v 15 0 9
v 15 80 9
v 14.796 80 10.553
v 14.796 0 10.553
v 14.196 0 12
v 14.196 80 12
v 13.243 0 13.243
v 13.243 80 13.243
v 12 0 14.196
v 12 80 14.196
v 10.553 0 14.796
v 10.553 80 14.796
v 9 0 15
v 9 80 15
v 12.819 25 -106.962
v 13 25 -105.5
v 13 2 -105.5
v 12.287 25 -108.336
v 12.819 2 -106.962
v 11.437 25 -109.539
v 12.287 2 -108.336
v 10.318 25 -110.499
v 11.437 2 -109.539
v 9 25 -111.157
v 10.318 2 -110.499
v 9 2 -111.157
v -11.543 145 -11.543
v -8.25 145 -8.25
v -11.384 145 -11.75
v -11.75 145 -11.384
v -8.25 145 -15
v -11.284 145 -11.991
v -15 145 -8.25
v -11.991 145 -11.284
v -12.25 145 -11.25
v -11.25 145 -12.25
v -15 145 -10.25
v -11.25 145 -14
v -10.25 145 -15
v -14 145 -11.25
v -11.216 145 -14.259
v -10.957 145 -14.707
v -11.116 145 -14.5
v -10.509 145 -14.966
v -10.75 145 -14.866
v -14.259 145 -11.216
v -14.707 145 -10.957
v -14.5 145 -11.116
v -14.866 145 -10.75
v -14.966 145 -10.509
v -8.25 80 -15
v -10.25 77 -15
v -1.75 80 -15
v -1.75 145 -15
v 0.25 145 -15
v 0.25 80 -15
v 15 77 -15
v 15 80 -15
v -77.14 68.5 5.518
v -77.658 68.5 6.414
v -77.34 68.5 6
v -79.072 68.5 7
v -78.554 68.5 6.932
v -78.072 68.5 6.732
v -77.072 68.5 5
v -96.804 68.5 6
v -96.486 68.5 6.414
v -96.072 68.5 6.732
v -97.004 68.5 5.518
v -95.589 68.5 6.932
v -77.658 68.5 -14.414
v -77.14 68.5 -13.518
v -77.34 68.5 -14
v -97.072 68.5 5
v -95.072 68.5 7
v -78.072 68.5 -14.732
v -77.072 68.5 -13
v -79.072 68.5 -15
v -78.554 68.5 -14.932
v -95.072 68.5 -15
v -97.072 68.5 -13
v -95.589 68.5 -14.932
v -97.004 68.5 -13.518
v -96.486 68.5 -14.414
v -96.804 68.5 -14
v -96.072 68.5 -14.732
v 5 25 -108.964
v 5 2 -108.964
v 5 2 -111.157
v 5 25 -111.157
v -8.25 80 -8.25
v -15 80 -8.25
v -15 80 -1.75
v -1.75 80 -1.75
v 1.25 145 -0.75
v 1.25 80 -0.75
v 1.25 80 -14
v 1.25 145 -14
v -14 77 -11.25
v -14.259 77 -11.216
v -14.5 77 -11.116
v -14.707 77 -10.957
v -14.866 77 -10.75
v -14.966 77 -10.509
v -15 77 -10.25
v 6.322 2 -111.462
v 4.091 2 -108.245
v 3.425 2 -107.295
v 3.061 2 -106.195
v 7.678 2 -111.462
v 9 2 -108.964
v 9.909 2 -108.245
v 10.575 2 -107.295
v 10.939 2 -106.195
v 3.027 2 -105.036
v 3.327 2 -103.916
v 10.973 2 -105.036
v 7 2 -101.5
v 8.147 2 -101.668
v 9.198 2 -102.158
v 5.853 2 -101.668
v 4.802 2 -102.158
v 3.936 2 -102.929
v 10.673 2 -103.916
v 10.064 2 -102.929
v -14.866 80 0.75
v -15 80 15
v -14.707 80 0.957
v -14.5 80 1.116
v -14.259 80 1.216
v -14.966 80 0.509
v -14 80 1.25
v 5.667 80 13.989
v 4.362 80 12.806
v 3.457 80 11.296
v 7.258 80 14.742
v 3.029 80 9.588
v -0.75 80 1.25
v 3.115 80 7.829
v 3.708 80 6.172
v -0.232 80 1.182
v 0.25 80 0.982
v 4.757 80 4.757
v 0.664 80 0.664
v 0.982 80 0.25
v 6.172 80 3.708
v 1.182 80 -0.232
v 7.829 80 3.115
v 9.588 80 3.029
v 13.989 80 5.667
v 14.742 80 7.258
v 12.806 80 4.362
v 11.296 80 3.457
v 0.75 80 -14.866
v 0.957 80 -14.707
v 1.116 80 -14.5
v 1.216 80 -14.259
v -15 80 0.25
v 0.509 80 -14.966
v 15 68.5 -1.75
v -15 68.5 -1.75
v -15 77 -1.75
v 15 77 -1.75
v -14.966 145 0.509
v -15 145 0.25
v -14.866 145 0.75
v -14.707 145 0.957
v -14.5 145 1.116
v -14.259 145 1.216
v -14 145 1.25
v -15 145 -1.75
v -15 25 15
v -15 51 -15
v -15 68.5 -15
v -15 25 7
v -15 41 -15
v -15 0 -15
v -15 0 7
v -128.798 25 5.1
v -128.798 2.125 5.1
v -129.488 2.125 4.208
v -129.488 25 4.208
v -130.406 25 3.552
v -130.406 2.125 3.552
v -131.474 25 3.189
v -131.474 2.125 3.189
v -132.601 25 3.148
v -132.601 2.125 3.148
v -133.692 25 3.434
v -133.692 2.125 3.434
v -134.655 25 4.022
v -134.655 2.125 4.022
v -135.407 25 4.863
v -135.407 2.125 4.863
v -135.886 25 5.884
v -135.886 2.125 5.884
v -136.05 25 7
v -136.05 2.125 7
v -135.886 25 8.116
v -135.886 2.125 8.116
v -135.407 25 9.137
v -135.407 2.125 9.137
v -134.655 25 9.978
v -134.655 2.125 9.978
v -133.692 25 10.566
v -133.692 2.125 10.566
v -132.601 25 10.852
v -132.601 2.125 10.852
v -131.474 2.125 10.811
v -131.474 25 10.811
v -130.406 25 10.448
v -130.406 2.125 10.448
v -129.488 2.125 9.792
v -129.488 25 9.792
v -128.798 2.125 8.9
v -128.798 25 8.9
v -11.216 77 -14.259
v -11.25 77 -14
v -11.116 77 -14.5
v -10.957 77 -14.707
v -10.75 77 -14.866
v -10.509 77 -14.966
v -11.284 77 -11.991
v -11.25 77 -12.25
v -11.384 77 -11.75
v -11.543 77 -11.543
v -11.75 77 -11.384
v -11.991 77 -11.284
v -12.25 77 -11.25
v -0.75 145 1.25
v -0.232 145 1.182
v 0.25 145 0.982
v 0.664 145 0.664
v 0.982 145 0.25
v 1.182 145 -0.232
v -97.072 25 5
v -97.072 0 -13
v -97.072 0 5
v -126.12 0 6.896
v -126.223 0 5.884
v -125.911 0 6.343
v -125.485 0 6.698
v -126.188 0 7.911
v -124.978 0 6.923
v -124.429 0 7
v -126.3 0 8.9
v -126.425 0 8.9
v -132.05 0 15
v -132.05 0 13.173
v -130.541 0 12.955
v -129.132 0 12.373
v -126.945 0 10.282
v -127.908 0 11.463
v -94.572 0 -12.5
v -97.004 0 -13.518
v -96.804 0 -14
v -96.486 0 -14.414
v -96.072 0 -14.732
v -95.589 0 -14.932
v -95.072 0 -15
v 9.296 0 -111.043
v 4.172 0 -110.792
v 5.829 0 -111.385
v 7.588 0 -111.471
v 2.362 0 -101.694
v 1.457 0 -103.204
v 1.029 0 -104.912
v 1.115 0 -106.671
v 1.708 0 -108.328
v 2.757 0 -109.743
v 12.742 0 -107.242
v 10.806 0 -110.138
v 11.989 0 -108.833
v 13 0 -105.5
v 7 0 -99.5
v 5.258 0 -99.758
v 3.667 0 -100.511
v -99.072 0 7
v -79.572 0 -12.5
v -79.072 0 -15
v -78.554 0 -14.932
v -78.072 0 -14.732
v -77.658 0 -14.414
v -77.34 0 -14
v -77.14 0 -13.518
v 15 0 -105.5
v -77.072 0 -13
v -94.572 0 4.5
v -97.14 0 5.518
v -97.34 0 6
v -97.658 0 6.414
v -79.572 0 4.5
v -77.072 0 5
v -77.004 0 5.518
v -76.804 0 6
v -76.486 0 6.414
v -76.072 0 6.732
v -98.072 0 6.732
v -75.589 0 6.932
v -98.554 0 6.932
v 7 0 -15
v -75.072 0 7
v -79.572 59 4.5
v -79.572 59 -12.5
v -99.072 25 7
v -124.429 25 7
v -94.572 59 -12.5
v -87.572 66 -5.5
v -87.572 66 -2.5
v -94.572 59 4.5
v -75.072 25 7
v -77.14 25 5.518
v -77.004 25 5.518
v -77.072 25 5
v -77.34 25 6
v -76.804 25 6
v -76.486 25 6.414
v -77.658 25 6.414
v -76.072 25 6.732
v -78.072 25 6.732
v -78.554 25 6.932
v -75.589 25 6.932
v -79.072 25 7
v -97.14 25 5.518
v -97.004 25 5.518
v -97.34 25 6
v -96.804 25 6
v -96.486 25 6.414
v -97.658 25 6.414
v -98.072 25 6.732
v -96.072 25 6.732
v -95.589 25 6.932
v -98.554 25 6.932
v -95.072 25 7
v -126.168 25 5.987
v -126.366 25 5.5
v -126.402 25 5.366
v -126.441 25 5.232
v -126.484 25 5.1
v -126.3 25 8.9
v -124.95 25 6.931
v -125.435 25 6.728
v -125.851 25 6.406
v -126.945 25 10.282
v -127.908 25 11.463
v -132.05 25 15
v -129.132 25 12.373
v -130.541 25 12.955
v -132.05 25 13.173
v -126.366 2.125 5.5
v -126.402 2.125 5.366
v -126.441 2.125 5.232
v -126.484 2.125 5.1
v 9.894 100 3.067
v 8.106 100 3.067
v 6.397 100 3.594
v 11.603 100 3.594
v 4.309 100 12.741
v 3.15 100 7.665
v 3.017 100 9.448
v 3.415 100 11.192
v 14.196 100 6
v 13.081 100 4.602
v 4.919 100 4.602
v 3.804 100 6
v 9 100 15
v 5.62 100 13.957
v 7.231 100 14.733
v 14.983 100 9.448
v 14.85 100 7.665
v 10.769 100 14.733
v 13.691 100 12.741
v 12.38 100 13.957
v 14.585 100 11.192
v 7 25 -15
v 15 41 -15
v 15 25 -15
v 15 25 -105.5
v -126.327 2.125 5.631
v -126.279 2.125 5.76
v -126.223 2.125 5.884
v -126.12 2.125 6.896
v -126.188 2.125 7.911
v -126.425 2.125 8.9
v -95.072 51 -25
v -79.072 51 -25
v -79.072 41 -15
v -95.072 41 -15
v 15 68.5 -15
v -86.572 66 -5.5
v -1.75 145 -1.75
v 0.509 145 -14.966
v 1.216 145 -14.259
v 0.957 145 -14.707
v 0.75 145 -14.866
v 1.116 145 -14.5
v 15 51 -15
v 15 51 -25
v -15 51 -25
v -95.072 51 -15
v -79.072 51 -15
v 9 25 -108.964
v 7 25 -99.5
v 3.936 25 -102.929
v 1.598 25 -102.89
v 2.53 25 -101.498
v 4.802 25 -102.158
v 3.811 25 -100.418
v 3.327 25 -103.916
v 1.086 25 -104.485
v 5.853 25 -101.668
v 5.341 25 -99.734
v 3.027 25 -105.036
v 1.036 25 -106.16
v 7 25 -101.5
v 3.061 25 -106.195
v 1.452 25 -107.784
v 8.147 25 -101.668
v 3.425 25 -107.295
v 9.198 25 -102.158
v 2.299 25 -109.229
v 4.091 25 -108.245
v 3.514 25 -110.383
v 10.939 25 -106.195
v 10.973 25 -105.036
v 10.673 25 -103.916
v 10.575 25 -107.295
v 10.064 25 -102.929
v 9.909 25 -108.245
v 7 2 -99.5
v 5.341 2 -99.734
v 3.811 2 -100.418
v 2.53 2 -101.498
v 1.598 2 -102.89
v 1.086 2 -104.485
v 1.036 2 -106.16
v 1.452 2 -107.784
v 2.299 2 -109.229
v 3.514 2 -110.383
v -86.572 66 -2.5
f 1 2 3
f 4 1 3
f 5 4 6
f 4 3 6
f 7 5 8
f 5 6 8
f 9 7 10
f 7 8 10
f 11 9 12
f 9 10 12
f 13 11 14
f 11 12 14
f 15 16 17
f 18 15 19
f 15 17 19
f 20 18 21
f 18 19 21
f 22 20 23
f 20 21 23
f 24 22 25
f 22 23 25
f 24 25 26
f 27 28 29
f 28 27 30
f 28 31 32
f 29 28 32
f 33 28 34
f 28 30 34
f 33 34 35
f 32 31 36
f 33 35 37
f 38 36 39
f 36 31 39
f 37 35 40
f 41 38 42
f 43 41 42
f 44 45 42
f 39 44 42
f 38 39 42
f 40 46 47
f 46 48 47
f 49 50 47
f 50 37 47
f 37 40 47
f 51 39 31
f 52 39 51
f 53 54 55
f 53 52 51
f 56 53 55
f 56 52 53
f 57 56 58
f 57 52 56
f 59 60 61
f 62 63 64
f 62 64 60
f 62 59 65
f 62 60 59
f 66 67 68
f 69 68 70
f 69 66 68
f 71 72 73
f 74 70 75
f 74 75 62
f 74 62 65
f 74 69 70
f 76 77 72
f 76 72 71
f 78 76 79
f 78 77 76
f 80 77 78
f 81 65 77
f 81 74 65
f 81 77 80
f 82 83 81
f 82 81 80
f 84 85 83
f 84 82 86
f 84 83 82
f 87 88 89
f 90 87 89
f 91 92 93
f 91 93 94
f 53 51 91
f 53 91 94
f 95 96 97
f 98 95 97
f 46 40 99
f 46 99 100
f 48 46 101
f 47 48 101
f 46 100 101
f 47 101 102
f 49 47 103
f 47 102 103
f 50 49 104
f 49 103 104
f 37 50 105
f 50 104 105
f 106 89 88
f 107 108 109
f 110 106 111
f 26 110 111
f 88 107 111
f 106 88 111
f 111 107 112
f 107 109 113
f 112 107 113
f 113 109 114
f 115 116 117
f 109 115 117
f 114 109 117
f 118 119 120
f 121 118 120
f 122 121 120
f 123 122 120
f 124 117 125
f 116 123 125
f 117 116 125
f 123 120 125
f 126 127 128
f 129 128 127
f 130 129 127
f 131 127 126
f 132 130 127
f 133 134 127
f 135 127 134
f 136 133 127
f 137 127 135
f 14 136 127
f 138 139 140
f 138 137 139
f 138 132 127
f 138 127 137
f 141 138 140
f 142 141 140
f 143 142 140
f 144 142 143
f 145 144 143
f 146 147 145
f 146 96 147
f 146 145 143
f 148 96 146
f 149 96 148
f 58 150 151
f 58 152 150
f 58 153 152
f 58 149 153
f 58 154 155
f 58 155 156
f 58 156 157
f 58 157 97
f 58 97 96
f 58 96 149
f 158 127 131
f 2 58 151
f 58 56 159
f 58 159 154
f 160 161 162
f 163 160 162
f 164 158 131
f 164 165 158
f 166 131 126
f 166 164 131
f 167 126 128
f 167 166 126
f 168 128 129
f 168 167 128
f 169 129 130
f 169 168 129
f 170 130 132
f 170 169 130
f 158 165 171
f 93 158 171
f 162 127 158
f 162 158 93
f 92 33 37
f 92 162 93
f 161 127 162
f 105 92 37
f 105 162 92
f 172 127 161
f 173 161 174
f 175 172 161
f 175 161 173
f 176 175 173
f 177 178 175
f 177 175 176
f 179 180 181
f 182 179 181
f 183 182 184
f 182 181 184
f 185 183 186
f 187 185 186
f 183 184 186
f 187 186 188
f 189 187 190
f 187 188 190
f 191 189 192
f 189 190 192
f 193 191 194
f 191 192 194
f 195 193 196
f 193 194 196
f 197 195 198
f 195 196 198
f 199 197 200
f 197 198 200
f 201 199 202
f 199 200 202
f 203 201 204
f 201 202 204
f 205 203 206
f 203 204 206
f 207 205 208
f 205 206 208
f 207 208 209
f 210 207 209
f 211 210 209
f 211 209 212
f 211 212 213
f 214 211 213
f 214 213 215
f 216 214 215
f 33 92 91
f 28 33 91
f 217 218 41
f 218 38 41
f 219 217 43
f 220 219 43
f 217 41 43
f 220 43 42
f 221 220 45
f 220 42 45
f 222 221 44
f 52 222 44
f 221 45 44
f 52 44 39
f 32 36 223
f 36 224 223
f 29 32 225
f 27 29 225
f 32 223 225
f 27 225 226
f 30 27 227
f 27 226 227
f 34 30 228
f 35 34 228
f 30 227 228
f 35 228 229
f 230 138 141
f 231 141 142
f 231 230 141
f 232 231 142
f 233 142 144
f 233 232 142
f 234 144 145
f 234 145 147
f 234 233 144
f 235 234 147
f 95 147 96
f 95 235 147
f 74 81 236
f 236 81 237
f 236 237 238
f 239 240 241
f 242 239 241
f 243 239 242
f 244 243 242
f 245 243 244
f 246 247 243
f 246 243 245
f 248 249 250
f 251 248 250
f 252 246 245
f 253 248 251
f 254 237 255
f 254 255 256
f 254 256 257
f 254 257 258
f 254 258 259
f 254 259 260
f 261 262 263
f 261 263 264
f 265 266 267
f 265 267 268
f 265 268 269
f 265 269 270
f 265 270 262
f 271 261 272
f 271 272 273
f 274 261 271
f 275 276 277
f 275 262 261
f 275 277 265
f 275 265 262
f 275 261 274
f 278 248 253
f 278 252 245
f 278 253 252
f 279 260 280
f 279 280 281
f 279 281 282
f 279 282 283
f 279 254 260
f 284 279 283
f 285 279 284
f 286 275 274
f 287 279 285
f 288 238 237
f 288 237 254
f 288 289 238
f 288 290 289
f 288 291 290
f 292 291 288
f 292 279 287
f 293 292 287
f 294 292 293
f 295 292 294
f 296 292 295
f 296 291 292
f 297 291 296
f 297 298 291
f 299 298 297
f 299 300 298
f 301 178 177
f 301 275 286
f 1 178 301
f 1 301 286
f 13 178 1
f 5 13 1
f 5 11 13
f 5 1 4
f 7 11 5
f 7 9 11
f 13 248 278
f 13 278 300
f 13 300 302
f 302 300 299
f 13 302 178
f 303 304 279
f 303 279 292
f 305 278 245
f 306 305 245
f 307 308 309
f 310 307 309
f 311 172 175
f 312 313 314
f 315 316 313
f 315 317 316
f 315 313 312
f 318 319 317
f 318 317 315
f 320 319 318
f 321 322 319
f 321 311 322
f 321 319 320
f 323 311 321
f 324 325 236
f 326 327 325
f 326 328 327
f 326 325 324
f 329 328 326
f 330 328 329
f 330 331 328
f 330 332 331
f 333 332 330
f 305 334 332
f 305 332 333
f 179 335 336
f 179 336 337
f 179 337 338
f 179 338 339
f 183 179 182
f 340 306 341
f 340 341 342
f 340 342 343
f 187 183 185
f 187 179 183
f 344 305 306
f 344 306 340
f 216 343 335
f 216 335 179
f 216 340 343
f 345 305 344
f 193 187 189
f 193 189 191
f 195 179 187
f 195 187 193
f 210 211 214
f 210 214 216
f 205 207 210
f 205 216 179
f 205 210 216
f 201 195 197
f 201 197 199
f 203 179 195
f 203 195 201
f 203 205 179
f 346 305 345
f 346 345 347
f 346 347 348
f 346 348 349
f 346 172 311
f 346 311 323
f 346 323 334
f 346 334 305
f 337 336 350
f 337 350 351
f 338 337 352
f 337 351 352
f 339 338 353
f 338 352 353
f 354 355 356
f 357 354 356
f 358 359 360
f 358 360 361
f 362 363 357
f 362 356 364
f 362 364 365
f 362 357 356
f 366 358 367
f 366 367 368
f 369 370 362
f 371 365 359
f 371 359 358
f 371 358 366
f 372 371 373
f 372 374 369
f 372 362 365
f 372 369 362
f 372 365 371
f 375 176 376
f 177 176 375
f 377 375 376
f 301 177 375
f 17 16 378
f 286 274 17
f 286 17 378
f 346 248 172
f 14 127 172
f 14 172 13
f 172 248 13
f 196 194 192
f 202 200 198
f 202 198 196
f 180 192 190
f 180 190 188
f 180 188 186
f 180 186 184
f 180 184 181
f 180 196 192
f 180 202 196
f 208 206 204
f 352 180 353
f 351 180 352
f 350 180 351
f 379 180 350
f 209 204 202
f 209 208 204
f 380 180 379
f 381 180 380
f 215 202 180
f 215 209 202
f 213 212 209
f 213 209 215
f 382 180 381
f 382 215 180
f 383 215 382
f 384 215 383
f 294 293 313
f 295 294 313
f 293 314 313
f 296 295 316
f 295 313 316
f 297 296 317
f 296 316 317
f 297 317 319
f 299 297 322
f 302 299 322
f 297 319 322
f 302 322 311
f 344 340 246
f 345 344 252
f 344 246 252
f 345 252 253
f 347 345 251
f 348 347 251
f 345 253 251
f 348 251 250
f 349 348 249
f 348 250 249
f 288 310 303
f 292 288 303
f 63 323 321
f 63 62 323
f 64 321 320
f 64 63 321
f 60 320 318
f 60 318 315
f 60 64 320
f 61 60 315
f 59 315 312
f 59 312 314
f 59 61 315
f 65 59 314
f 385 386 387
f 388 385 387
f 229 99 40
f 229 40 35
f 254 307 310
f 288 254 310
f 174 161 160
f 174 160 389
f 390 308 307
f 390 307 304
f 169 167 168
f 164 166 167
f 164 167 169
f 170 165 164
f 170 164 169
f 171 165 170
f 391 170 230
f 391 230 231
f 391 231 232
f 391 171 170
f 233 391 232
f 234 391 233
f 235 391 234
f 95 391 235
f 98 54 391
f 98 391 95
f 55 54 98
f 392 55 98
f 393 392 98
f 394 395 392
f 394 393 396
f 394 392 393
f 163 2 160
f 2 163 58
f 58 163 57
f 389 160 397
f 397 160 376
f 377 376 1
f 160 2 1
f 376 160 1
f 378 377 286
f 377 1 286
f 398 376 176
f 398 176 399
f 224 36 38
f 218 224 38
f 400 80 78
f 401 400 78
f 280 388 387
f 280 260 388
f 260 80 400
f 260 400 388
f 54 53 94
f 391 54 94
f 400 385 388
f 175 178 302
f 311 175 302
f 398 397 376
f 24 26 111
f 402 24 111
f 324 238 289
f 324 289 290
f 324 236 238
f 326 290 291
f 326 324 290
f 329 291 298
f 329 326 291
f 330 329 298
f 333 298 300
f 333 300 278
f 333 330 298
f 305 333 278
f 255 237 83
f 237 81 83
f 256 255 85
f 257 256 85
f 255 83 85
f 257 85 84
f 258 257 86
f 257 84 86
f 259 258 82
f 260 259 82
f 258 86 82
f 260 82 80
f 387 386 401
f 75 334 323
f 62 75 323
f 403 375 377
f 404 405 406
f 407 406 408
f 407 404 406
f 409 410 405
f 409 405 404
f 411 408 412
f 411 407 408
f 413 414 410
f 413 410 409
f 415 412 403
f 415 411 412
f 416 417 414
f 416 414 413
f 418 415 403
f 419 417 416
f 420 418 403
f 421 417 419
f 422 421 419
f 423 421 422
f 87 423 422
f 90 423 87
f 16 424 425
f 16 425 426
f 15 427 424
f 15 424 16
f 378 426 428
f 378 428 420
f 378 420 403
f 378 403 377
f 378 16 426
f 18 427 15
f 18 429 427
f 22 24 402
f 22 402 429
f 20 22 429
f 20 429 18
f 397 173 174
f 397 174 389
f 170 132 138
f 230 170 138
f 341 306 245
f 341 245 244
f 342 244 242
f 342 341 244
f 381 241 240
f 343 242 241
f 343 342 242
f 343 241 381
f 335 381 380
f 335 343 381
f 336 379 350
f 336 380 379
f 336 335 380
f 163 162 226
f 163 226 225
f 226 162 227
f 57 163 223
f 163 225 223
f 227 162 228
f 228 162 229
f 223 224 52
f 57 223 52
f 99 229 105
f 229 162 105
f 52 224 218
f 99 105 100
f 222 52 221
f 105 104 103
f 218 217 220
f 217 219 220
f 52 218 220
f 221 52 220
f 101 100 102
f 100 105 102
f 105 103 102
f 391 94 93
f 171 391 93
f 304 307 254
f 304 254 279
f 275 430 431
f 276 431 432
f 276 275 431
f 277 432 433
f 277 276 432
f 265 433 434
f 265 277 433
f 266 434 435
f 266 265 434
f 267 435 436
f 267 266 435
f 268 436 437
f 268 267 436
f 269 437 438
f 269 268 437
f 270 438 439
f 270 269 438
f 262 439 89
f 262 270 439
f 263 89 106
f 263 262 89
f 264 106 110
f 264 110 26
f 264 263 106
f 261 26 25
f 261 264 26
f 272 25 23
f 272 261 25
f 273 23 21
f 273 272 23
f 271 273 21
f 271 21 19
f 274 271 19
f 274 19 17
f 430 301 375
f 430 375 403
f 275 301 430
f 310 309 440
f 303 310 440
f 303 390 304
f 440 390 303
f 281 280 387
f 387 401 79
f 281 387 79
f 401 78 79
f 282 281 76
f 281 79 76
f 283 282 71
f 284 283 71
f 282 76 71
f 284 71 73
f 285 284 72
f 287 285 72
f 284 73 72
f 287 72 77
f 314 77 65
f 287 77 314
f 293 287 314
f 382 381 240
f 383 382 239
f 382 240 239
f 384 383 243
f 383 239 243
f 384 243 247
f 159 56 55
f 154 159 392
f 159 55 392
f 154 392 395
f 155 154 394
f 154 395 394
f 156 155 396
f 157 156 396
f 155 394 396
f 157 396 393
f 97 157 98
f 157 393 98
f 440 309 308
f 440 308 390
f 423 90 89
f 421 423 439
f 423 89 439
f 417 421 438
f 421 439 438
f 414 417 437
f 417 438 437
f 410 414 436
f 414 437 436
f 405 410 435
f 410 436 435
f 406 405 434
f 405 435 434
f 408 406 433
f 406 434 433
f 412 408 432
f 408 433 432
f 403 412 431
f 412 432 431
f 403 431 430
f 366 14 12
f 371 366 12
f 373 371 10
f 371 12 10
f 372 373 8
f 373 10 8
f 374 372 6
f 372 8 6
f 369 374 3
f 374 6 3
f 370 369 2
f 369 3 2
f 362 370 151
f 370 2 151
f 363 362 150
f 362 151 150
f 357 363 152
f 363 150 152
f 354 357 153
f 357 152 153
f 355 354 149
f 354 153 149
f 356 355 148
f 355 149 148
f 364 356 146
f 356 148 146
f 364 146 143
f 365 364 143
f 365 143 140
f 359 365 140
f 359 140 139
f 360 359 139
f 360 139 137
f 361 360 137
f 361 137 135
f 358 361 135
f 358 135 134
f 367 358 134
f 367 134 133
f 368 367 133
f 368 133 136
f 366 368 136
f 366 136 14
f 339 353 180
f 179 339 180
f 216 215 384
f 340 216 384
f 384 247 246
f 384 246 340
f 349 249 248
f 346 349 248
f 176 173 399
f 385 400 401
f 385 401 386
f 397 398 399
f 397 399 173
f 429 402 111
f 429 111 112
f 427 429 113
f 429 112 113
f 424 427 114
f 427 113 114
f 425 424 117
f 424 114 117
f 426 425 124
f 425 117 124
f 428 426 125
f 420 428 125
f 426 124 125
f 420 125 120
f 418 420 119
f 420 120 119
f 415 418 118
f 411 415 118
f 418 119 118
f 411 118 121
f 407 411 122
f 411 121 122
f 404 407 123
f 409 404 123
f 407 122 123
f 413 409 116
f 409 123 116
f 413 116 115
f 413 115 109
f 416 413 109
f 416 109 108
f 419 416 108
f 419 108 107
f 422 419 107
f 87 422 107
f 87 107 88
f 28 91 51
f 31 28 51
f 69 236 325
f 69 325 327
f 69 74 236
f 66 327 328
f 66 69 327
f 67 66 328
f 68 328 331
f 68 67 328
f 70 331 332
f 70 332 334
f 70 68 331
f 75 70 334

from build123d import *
from build123d.topology import SkipClean

# Parameters (mm, degrees)
SKETCH1_W                 = 30
SKETCH1_H                 = 30
BOSS_EXTRUDE1_DEPTH       = 80
SKETCH2_R                 = 6
BOSS_EXTRUDE2_DEPTH       = 20
CUT_EXTRUDE1_DEPTH        = 83.764726786
BOSS_EXTRUDE3_DEPTH       = 65
BOSS_EXTRUDE5_DEPTH       = 2
BOSS_EXTRUDE6_DEPTH       = 23
BOSS_EXTRUDE7_DEPTH       = 25
FILLET1_R                 = 2
SKETCH11_R                = 6.055782361
CUT_EXTRUDE2_DEPTH        = 2.125
CUT_EXTRUDE3_DEPTH        = 238.220050797
CUT_EXTRUDE3_DEPTH_BACK   = 238.220050797
SKETCH12_W                = 13.25
SKETCH12_H                = 8.5
FILLET2_R                 = 2
CUT_EXTRUDE4_REACH        = 195.24
SKETCH15_W                = 3.75
SKETCH15_H                = 3.75
FILLET3_R                 = 1
BOSS_EXTRUDE8_REACH       = 229.962
SKETCH16_W                = 20
SKETCH16_H                = 22
FILLET4_R                 = 2
FILLET5_R                 = 2
SKETCH17_W                = 15
SKETCH17_H                = 17
CUT_EXTRUDE5_DEPTH        = 66
CHAMFER1_SIZE             = 7
BOSS_EXTRUDE9_DEPTH       = 30
BOSS_EXTRUDE10_DEPTH      = 7.999995
BOSS_EXTRUDE10_DEPTH_BACK = 8.000005


with BuildPart() as part:
    # Sketch1 → Boss-Extrude1 (new body)
    with BuildSketch(Plane(origin=(0, 0, 0), x_dir=(1, 0, 0), z_dir=(0, 1, 0))):
        Rectangle(SKETCH1_W, SKETCH1_H)
    extrude(amount=BOSS_EXTRUDE1_DEPTH)

    # Sketch2 → Boss-Extrude2 (add)
    with BuildSketch(Plane(origin=(0, 80, 0), x_dir=(1, 0, 0), z_dir=(0, 1, 0))):
        with Locations(Location((9, -9, 0), (0, 0, 270))):
            Circle(SKETCH2_R)
    extrude(amount=BOSS_EXTRUDE2_DEPTH)

    # Sketch3 → Cut-Extrude1 (cut, through all)
    with BuildSketch(Plane(origin=(0, 80, 0), x_dir=(1, 0, 0), z_dir=(0, 1, 0))):
        with BuildLine():
            Line((9, -15), (15, -15))
            Line((15, -15), (15, -9))
            ThreePointArc((15, -9), (13.242640687, -13.242640687), (9, -15))
        make_face()
    extrude(amount=-CUT_EXTRUDE1_DEPTH, mode=Mode.SUBTRACT)

    # Sketch4 → Boss-Extrude3 (add)
    with BuildSketch(Plane(origin=(0, 80, 0), x_dir=(1, 0, 0), z_dir=(0, 1, 0))):
        Polygon((1.25, 11.25), (1.25, 15), (-1.75, 15), (-1.75, 11.25), (-1.75, 1.75), (-11.25, 1.75), (-15, 1.75), (-15, -1.25), (-11.25, -1.25), (1.25, -1.25), align=None)
        Polygon((-8.25, 11.25), (-8.25, 8.25), (-11.25, 8.25), (-15, 8.25), (-15, 11.25), (-11.25, 11.25), (-11.25, 15), (-8.25, 15), align=None)
    extrude(amount=BOSS_EXTRUDE3_DEPTH)

    # Sketch6 → Boss-Extrude5 (add)
    with BuildSketch(Plane.XZ):
        with BuildLine():
            Line((15, -15), (7, -15))
            Line((7, -15), (7, -99.5))
            ThreePointArc((7, -99.5), (2.757359313, -109.742640687), (13, -105.5))
            Line((13, -105.5), (15, -105.5))
            Line((15, -105.5), (15, -15))
        make_face()
    extrude(amount=-BOSS_EXTRUDE5_DEPTH)

    # Sketch7 → Boss-Extrude6 (add)
    with SkipClean():  # the faces are left unmerged after this step: merging them gives an invalid solid
        with BuildSketch(Plane(origin=(0, 2, 0), x_dir=(1, 0, 0), z_dir=(0, 1, 0))):
            with BuildLine():
                Line((9, 111.156854249), (9, 108.964101615))
                ThreePointArc((9, 108.964101615), (7, 101.5), (5, 108.964101615))
                Line((5, 108.964101615), (5, 111.156854249))
                ThreePointArc((5, 111.156854249), (1.086408642, 104.485388128), (7, 99.5))
                Line((7, 99.5), (7, 15))
                Line((7, 15), (15, 15))
                Line((15, 15), (15, 105.5))
                Line((15, 105.5), (13, 105.5))
                ThreePointArc((13, 105.5), (11.898979486, 108.964101615), (9, 111.156854249))
            make_face()
        extrude(amount=BOSS_EXTRUDE6_DEPTH)

    # Sketch9 → Boss-Extrude7 (add)
    with SkipClean():  # the faces are left unmerged after this step: merging them gives an invalid solid
        with BuildSketch(Plane.XZ):
            with BuildLine():
                Line((-15, 15), (-15, 7))
                Line((-15, 7), (-126.175, 7))
                ThreePointArc((-126.175, 7), (-126.252697751, 6.037536458), (-126.48377869, 5.1))
                Line((-126.48377869, 5.1), (-128.797778509, 5.1))
                ThreePointArc((-128.797778509, 5.1), (-136.05, 7), (-128.797778509, 8.9))
                Line((-128.797778509, 8.9), (-126.3, 8.9))
                ThreePointArc((-126.3, 8.9), (-128.491885554, 11.955834237), (-132.050001601, 13.173329766))
                Line((-132.050001601, 13.173329766), (-132.050001601, 15))
                Line((-132.050001601, 15), (-15, 15))
            make_face()
        extrude(amount=-BOSS_EXTRUDE7_DEPTH)

    # Fillet1
    fillet1_edges = [part.edges().sort_by_distance(p)[0] for p in [
        (-126.175, 12.5, 7),
    ]]
    fillet(fillet1_edges, radius=FILLET1_R)

    # Sketch11 → Cut-Extrude2 (cut)
    with SkipClean():  # the faces are left unmerged after this step: merging them gives an invalid solid
        with BuildSketch(Plane.XZ):
            with Locations((-132.175, 7)):
                Circle(SKETCH11_R)
        extrude(amount=-CUT_EXTRUDE2_DEPTH, mode=Mode.SUBTRACT)

    # Sketch12 → Cut-Extrude3 (cut, two sides: drawn at the far end of the back side and taken through both)
    with SkipClean():  # the faces are left unmerged after this step: merging them gives an invalid solid
        with BuildSketch(Plane(origin=(15, 0, 0), x_dir=(0, 0, -1), z_dir=(1, 0, 0)).offset(-CUT_EXTRUDE3_DEPTH_BACK)):
            with Locations((8.375, 72.75)):
                Rectangle(SKETCH12_W, SKETCH12_H)
        extrude(amount=CUT_EXTRUDE3_DEPTH + CUT_EXTRUDE3_DEPTH_BACK, mode=Mode.SUBTRACT)

    # Fillet2
    fillet2_edges = [part.edges().sort_by_distance(p)[0] for p in [
        (1.25, 112.5, 1.25),
    ]]
    fillet(fillet2_edges, radius=FILLET2_R)

    # Sketch15 → Cut-Extrude4 (cut, up to next)
    with BuildSketch(Plane(origin=(0, 80, 0), x_dir=(1, 0, 0), z_dir=(0, 1, 0)), mode=Mode.PRIVATE) as cut_extrude4_sk1:
        with Locations((-13.125, 13.125)):
            Rectangle(SKETCH15_W, SKETCH15_H)
    cut_extrude4_tool1 = extrude(cut_extrude4_sk1.sketch, amount=-CUT_EXTRUDE4_REACH, mode=Mode.PRIVATE) & part.part
    add(cut_extrude4_tool1.solids().sort_by_distance((-13.125, 80, -13.125))[0], mode=Mode.SUBTRACT)

    # Fillet3
    fillet3_edges = [part.edges().sort_by_distance(p)[0] for p in [
        (-11.25, 112.5, -15),
        (-11.25, 112.5, -11.25),
        (-15, 112.5, -11.25),
        (-15, 112.5, 1.25),
        (1.25, 112.5, -15),
    ]]
    fillet(fillet3_edges, radius=FILLET3_R)

    # Boss-Extrude8: up to this face of the body (flat: up to its plane)
    boss_extrude8_end = Plane(part.part.faces().sort_by_distance((0, 68.5, -8.375))[0])
    # Sketch16 → Boss-Extrude8 (add, up to the picked face)
    with BuildSketch(Plane.XZ, mode=Mode.PRIVATE) as boss_extrude8_sk1:
        with Locations((-87.071774981, -4)):
            Rectangle(SKETCH16_W, SKETCH16_H)
    boss_extrude8_tool1 = split(extrude(boss_extrude8_sk1.sketch, amount=-BOSS_EXTRUDE8_REACH, mode=Mode.PRIVATE), bisect_by=boss_extrude8_end, keep=Keep.BOTH, mode=Mode.PRIVATE)
    add(boss_extrude8_tool1.solids().sort_by(Axis((-87.071775, 0, -4), (0, 1, 0)))[0])

    # Fillet4
    fillet4_edges = [part.edges().sort_by_distance(p)[0] for p in [
        (-77.071774981, 12.5, 7),
        (-77.071774981, 34.25, -15),
        (-97.071774981, 34.25, -15),
        (-97.071774981, 12.5, 7),
    ]]
    fillet(fillet4_edges, radius=FILLET4_R)

    # Fillet5
    fillet5_edges = [part.edges().sort_by_distance(p)[0] for p in [
        (-77.071774981, 46.75, 7),
        (-97.071774981, 46.75, 7),
    ]]
    fillet(fillet5_edges, radius=FILLET5_R)

    # Sketch17 → Cut-Extrude5 (cut)
    with SkipClean():  # the faces are left unmerged after this step: merging them gives an invalid solid
        with BuildSketch(Plane.XZ):
            with Locations((-87.071774981, -4)):
                Rectangle(SKETCH17_W, SKETCH17_H)
        extrude(amount=-CUT_EXTRUDE5_DEPTH, mode=Mode.SUBTRACT)

    # Chamfer1
    chamfer1_edges = [part.edges().sort_by_distance(p)[0] for p in [
        (-94.571774981, 66, -4),
        (-87.071774981, 66, 4.5),
        (-79.571774981, 66, -4),
        (-87.071774981, 66, -12.5),
    ]]
    chamfer(chamfer1_edges, length=CHAMFER1_SIZE)

    # Sketch18 → Boss-Extrude9 (add)
    with SkipClean():  # the faces are left unmerged after this step: merging them gives an invalid solid
        with BuildSketch(Plane(origin=(15, 0, 0), x_dir=(0, 0, -1), z_dir=(1, 0, 0))):
            Polygon((15, 51), (15, 41), (25, 51), align=None)
        extrude(amount=-BOSS_EXTRUDE9_DEPTH)

    # Sketch19 → Boss-Extrude10 (add, two sides: drawn at the far end of the back side and taken through both)
    with SkipClean():  # the faces are left unmerged after this step: merging them gives an invalid solid
        with BuildSketch(Plane.ZY.offset(87.071774981).offset(-BOSS_EXTRUDE10_DEPTH_BACK)):
            Polygon((-15, 41), (-15, 51), (-25, 51), align=None)
        extrude(amount=BOSS_EXTRUDE10_DEPTH + BOSS_EXTRUDE10_DEPTH_BACK)


solid = part.part
